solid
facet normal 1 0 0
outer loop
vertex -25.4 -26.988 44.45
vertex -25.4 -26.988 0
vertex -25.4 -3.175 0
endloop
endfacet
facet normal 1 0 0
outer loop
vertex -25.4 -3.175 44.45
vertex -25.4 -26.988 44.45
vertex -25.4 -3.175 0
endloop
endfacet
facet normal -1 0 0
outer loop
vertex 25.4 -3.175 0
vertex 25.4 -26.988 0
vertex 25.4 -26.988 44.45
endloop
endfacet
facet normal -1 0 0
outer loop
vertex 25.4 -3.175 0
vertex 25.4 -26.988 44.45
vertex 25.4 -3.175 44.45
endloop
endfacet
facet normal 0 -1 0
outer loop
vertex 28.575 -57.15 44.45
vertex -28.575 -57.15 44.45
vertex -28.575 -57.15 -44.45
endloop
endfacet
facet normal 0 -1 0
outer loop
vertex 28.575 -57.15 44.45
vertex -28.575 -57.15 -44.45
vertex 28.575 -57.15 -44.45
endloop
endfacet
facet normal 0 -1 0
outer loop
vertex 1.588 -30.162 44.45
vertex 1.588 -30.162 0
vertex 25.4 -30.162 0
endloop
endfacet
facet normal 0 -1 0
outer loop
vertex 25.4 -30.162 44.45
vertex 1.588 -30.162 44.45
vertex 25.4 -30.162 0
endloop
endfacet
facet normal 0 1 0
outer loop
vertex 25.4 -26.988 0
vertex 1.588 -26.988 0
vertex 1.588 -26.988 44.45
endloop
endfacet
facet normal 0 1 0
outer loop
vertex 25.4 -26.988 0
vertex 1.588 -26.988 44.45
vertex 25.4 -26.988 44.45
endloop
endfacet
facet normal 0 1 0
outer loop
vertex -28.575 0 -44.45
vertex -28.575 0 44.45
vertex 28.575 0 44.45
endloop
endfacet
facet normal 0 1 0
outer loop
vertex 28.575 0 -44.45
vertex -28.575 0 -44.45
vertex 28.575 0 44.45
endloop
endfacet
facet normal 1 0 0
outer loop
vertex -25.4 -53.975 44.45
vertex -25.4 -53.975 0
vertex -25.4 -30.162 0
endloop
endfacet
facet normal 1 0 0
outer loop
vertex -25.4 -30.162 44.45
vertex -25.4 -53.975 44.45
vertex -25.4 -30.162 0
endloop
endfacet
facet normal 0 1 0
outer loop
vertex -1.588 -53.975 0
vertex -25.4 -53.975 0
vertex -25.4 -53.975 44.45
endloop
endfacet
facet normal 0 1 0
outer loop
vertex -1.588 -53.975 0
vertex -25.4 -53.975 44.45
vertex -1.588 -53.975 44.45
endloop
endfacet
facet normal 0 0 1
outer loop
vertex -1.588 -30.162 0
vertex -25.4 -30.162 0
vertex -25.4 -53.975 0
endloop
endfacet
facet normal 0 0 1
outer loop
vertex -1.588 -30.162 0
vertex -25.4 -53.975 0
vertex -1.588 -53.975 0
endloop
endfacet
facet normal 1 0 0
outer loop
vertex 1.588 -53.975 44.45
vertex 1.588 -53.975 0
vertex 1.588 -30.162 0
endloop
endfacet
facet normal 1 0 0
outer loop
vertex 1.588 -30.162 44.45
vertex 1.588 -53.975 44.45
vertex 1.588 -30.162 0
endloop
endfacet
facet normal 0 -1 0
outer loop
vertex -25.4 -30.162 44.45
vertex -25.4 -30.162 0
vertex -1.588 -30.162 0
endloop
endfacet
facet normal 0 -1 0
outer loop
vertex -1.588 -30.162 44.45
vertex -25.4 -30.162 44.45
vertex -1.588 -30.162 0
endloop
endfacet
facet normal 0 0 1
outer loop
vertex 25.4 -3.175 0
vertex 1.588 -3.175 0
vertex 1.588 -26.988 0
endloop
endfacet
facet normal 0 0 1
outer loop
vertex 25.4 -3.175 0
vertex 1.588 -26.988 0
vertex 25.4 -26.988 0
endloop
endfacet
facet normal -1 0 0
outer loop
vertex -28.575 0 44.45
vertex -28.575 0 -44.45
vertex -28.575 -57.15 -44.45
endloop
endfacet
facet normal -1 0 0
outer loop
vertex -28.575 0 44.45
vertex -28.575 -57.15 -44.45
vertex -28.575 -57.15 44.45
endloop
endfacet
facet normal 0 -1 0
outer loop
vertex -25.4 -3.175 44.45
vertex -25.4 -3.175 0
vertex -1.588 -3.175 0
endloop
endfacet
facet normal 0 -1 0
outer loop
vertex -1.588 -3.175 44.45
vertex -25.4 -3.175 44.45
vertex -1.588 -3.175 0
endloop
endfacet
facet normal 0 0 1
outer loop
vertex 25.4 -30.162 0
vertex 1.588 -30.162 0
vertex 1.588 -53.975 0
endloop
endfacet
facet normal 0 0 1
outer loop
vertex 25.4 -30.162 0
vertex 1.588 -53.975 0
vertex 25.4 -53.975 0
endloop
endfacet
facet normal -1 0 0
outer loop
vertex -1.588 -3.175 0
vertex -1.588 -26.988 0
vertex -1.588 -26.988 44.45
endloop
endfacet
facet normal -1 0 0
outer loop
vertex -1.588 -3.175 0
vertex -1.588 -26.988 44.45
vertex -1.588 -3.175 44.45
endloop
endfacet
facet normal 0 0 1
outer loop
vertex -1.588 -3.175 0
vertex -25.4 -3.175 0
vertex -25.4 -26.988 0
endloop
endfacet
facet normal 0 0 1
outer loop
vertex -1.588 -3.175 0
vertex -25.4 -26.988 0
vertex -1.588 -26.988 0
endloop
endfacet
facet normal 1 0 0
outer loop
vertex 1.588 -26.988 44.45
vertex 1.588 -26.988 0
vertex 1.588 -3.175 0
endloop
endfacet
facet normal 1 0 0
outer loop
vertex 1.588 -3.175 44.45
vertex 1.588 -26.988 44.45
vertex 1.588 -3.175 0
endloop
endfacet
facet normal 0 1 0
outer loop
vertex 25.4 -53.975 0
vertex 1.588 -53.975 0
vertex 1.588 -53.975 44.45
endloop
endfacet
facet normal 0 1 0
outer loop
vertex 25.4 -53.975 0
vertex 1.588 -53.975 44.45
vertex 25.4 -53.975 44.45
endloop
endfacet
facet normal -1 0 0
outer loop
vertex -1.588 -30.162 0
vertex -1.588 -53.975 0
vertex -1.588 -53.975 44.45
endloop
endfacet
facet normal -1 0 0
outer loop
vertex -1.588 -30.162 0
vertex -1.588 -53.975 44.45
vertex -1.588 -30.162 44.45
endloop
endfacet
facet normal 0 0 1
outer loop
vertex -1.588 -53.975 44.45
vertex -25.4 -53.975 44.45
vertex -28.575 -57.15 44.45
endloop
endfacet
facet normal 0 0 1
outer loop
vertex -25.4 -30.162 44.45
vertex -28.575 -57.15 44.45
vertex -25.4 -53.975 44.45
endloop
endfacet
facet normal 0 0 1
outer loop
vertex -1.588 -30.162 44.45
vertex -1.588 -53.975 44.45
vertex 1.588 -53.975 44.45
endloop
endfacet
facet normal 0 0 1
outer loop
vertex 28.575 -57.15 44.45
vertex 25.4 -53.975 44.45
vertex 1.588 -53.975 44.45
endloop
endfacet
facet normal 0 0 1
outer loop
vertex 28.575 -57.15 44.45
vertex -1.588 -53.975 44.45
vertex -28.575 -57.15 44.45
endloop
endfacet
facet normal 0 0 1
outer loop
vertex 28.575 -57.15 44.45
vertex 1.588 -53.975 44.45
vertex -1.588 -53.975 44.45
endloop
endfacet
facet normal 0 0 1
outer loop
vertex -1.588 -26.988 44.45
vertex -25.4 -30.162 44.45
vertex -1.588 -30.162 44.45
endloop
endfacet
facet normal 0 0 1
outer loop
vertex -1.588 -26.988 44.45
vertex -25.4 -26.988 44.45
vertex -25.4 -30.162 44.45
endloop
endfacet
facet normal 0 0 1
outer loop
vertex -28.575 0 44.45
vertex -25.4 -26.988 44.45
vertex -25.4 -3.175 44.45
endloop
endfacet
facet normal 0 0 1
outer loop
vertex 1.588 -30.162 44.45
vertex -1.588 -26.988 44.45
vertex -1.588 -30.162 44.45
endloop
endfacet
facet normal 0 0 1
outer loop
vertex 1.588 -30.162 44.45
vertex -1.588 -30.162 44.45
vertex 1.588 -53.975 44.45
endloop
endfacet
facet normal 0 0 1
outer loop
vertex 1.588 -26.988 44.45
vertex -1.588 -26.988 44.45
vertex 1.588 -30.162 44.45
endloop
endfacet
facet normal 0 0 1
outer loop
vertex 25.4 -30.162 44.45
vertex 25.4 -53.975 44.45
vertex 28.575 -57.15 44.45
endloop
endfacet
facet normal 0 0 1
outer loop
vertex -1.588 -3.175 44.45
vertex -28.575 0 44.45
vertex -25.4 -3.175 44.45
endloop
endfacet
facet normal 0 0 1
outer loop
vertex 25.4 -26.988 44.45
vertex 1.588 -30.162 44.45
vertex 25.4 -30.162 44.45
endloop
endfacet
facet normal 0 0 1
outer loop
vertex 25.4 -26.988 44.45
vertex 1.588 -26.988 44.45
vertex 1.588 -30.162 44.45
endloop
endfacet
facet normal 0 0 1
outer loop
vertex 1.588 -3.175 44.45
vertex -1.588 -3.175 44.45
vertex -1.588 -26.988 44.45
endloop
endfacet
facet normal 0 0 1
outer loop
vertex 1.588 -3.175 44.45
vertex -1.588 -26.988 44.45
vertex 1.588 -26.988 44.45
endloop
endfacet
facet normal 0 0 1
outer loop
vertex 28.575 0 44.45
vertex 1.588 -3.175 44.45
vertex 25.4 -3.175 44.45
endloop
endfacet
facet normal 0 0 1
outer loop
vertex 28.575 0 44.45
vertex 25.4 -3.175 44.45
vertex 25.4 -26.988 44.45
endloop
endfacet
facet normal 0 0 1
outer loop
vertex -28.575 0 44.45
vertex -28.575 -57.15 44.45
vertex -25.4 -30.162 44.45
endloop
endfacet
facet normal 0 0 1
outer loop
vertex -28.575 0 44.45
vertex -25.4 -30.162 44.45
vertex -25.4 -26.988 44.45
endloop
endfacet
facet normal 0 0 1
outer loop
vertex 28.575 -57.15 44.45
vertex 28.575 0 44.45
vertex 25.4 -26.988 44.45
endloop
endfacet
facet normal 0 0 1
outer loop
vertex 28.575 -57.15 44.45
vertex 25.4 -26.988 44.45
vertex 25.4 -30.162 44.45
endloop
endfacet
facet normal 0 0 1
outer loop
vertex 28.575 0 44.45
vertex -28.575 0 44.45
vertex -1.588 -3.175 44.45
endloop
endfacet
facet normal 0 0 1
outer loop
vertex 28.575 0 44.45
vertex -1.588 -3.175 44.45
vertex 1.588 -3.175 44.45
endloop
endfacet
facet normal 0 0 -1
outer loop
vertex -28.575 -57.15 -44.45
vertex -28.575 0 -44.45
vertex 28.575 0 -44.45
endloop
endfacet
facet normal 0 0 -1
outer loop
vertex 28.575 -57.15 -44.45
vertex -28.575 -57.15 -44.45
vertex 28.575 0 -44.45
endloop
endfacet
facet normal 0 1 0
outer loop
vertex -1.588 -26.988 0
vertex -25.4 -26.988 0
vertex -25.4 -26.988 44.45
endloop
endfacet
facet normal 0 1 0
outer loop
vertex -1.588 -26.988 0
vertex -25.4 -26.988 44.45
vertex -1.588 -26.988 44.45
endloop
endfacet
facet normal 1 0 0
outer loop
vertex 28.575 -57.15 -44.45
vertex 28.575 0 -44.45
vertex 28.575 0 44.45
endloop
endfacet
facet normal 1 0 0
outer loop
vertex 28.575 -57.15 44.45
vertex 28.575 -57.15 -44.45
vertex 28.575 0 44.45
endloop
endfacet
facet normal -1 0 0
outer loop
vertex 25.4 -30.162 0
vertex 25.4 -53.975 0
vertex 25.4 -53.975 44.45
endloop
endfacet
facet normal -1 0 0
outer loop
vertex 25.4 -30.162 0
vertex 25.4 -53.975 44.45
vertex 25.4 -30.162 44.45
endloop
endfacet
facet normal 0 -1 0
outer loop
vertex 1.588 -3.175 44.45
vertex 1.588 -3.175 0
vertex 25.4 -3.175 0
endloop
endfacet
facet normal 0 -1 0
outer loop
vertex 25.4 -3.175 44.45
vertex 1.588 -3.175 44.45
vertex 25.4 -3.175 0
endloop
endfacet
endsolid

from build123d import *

# Parameters (mm, degrees)
F0_W     = 57.15
F0_H     = 88.9
F1_DEPTH = 57.15
F2_W     = 23.8125
F2_H     = 23.8125
F6_DEPTH = 44.451
F3_W     = 23.8125
F3_H     = 23.8125
F7_DEPTH = 44.451
F4_W     = 23.8125
F4_H     = 23.8125
F8_DEPTH = 44.451
F5_W     = 23.8125
F5_H     = 23.8125
F9_DEPTH = 44.451


with BuildPart() as f1:
    # F0 (on Front) → F1 (new body)
    with BuildSketch(Plane.XZ):
        Rectangle(F0_W, F0_H)
    extrude(amount=F1_DEPTH)

    # F2 (on Top) → F6 (cut, through all)
    with BuildSketch(Plane.XY):
        with Locations((-13.49375, -15.08125)):
            Rectangle(F2_W, F2_H)
    extrude(amount=F6_DEPTH, mode=Mode.SUBTRACT)

    # F3 (on Top) → F7 (cut, through all)
    with BuildSketch(Plane.XY):
        with Locations((-13.49375, -42.06875)):
            Rectangle(F3_W, F3_H)
    extrude(amount=F7_DEPTH, mode=Mode.SUBTRACT)

    # F4 (on Top) → F8 (cut, through all)
    with BuildSketch(Plane.XY):
        with Locations((13.49375, -15.08125)):
            Rectangle(F4_W, F4_H)
    extrude(amount=F8_DEPTH, mode=Mode.SUBTRACT)

    # F5 (on Top) → F9 (cut, through all)
    with BuildSketch(Plane.XY):
        with Locations((13.49375, -42.06875)):
            Rectangle(F5_W, F5_H)
    extrude(amount=F9_DEPTH, mode=Mode.SUBTRACT)


solid = f1.part
